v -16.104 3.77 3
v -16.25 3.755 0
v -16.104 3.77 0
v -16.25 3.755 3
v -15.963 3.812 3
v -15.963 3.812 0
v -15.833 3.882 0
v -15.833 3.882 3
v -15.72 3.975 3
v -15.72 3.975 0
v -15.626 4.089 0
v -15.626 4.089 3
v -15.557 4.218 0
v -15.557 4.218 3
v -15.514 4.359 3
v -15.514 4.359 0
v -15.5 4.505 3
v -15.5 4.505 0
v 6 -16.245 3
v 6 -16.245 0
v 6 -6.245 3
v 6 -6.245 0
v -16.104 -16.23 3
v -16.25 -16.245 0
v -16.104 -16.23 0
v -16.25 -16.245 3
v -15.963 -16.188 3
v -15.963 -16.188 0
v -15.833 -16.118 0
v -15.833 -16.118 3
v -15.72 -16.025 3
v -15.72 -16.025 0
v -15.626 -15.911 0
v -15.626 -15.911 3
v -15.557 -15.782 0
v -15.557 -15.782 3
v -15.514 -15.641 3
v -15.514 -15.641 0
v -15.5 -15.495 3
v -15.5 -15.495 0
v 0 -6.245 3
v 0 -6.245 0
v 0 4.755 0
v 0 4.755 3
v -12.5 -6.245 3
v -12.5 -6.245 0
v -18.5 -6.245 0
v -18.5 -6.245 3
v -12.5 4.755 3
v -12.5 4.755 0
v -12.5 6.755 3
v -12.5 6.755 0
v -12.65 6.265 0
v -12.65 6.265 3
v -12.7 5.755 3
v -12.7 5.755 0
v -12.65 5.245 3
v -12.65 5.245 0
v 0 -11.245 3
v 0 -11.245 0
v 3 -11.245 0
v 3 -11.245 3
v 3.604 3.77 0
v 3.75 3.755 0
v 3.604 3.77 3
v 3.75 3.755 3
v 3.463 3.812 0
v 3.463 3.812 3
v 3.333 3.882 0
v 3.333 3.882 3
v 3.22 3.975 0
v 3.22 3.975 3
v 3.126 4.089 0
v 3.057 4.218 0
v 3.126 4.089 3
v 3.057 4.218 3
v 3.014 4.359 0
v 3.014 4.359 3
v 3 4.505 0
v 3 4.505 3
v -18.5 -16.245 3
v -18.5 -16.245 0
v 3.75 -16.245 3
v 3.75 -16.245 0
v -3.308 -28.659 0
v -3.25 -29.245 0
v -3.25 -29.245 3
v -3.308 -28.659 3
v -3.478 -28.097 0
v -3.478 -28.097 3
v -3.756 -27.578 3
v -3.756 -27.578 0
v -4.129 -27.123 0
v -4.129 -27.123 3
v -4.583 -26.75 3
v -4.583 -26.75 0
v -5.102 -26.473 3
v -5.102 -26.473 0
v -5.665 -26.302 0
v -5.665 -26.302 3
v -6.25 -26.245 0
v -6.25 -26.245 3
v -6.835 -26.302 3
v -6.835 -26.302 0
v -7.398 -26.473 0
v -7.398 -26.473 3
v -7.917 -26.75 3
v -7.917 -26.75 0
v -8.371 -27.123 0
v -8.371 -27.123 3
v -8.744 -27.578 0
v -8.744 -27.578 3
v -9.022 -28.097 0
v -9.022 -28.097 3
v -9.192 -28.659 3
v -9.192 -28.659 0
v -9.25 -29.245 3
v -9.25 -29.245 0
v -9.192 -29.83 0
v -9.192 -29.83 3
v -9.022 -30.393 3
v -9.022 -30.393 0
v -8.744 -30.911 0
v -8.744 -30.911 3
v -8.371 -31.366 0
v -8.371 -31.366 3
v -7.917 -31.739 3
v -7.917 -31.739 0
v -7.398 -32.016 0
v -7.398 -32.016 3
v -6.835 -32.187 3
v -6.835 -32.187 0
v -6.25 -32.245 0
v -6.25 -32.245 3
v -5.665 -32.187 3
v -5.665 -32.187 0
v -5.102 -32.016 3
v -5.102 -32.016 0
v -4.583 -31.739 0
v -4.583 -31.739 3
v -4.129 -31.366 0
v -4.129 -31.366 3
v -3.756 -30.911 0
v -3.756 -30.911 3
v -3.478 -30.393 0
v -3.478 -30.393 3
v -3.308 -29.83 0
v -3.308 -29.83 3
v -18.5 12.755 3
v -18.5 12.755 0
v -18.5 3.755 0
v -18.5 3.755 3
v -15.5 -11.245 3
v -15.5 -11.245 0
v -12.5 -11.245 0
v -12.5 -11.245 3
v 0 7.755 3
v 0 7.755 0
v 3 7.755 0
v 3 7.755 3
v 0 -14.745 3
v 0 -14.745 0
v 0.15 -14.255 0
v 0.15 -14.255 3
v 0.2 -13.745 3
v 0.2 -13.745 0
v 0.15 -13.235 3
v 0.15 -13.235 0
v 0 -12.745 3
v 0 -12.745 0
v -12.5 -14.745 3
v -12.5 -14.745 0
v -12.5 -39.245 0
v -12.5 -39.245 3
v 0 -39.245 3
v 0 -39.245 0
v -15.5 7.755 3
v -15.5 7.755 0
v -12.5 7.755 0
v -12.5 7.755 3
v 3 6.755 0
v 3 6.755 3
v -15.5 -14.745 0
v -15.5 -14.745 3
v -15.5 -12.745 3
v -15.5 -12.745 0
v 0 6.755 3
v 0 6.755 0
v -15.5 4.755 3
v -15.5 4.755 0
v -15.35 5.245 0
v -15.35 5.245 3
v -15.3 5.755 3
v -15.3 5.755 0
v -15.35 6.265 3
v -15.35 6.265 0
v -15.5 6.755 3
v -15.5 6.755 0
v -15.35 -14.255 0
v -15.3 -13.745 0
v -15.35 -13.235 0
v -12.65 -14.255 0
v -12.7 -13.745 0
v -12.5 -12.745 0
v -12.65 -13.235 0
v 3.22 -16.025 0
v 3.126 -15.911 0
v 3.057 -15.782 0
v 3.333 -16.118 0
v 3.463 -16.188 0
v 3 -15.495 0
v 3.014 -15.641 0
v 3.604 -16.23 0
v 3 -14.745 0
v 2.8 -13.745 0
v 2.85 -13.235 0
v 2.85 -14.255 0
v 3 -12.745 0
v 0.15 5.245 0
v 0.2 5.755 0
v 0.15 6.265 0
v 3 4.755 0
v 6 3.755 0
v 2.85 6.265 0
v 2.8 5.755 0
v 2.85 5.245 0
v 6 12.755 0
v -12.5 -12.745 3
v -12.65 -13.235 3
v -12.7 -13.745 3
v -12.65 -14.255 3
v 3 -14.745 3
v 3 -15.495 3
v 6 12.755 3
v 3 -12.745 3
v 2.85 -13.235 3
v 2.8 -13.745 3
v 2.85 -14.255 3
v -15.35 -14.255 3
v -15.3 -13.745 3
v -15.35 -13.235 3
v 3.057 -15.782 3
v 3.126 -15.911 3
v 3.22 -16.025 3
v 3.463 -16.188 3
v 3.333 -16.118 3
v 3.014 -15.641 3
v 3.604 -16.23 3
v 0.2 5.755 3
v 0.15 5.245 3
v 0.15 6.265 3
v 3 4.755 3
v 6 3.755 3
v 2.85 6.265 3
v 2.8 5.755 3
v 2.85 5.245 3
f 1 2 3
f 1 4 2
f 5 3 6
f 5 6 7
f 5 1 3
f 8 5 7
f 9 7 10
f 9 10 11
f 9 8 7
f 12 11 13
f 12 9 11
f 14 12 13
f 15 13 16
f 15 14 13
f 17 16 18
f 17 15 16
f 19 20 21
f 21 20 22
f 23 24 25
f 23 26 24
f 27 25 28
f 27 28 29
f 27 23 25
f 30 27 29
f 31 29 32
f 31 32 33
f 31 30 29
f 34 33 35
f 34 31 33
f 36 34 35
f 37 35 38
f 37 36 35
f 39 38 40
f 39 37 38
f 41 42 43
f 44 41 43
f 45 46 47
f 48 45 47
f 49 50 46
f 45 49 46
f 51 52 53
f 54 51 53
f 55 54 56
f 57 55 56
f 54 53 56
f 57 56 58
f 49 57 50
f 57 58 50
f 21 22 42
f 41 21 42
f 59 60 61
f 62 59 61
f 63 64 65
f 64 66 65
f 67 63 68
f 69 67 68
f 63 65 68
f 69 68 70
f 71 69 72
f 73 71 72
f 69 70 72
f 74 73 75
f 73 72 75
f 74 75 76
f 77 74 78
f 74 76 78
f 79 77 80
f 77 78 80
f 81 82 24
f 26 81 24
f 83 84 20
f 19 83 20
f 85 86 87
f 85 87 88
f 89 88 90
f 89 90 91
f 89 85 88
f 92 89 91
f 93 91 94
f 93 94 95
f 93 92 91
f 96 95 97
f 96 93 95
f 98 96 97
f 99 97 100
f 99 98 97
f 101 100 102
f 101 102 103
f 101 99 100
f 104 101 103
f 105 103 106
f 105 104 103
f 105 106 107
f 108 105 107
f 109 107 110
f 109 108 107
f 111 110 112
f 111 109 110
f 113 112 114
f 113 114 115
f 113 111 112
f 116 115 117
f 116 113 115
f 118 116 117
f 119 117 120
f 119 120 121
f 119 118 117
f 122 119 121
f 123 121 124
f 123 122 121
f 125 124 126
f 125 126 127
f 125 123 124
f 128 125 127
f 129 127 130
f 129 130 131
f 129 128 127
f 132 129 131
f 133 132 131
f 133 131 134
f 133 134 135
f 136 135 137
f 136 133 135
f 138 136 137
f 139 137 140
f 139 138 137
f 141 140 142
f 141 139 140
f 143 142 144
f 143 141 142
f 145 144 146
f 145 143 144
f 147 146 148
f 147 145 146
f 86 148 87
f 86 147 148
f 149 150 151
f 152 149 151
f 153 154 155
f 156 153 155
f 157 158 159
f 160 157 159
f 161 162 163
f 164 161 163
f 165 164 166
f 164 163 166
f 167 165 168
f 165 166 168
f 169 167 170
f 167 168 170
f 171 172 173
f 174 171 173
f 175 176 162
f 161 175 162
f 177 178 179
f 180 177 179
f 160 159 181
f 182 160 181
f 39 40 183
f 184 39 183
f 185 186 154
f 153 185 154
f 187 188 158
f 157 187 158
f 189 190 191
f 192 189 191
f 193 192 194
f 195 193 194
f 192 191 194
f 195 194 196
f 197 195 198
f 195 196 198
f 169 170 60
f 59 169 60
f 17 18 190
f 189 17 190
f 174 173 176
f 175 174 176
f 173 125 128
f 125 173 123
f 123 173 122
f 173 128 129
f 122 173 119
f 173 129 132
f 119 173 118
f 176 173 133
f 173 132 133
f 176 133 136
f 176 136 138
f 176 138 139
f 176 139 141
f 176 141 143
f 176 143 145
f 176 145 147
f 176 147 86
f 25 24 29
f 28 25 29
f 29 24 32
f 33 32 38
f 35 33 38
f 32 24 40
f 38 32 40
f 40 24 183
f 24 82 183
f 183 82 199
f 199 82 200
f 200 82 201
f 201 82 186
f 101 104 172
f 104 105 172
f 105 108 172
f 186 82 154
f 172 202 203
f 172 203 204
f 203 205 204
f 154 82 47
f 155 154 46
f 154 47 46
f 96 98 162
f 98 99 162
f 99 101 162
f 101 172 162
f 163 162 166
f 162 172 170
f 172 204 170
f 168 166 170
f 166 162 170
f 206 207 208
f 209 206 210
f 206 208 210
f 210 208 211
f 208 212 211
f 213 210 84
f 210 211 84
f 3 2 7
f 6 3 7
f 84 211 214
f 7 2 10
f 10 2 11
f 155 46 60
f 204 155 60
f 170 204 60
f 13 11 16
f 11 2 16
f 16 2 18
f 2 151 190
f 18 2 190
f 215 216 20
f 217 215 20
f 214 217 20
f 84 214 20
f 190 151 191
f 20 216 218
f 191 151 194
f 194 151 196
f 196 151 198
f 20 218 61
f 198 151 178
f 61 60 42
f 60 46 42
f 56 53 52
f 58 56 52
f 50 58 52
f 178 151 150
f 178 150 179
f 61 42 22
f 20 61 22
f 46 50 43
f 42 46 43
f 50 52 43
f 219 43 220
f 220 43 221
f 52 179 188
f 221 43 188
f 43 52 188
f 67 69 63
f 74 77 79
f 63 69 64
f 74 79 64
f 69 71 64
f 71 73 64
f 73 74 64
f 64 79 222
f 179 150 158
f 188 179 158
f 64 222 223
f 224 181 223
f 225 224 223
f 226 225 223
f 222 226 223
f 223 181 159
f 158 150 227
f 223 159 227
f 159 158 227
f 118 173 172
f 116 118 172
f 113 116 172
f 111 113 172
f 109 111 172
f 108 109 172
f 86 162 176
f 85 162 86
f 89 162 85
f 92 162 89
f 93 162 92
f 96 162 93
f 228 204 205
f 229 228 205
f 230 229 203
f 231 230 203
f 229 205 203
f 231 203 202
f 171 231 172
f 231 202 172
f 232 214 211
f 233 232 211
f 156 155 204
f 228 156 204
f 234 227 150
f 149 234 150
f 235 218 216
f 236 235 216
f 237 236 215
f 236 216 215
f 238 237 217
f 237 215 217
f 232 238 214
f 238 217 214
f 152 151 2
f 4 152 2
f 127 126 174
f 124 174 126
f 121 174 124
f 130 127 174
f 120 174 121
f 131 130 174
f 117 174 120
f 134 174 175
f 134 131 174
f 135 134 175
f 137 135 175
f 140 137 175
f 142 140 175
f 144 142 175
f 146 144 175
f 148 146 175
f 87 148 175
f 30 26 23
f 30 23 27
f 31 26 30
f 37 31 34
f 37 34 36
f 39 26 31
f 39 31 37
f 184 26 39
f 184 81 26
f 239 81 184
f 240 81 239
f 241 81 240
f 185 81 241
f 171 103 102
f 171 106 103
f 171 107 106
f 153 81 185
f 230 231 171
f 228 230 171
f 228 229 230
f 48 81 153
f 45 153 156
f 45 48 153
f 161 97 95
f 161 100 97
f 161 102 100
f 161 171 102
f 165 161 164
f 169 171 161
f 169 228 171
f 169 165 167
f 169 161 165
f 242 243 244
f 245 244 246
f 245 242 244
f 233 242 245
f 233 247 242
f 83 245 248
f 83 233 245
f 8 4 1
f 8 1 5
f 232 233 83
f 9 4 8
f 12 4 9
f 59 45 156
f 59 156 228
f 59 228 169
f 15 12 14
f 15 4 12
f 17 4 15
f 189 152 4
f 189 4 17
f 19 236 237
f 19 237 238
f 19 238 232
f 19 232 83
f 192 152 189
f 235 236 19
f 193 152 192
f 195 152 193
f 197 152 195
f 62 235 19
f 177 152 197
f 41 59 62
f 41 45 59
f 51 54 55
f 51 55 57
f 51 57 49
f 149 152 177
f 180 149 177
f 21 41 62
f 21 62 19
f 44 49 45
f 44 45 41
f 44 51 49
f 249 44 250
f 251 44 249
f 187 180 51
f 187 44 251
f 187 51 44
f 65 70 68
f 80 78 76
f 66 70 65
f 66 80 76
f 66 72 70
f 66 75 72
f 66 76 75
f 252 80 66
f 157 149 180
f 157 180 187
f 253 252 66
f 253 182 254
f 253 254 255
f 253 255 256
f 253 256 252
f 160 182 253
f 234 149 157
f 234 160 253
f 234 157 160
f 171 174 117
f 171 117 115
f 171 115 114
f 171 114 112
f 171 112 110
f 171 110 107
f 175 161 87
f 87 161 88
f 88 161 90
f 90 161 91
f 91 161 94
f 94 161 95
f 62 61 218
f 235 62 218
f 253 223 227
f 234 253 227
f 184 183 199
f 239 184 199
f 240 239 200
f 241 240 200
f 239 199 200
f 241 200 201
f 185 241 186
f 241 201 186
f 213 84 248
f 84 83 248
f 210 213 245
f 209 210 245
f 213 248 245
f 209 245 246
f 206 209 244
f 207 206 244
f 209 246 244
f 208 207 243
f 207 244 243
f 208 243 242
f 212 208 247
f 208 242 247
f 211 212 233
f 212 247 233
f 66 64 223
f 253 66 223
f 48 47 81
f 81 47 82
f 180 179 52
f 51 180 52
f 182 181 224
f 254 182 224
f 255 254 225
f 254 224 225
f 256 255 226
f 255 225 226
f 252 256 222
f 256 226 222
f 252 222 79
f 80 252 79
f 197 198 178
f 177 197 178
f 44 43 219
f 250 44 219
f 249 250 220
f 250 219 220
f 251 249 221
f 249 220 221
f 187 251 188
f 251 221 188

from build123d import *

# Parameters (mm, degrees)
SKETCH1_R           = 3
BOSS_EXTRUDE1_DEPTH = 3
FILLET3_R           = 0.75
FILLET4_R           = 0.75


with BuildPart() as part:
    # Sketch1 → Boss-Extrude1 (new body)
    with BuildSketch(Plane.XY):
        with BuildLine():
            Line((6, 12.755292895), (-18.5, 12.755292895))
            Line((-18.5, 12.755292895), (-18.5, 3.755292895))
            Line((-18.5, 3.755292895), (-15.5, 3.755292895))
            Line((-15.5, 3.755292895), (-15.5, 4.755292895))
            ThreePointArc((-15.5, 4.755292895), (-15.3, 5.755292895), (-15.5, 6.755292895))
            Line((-15.5, 6.755292895), (-15.5, 7.755292895))
            Line((-15.5, 7.755292895), (-12.5, 7.755292895))
            Line((-12.5, 7.755292895), (-12.5, 6.755292895))
            ThreePointArc((-12.5, 6.755292895), (-12.7, 5.755292895), (-12.5, 4.755292895))
            Line((-12.5, 4.755292895), (-12.5, -6.244707105))
            Line((-12.5, -6.244707105), (-18.5, -6.244707105))
            Line((-18.5, -6.244707105), (-18.5, -16.244707105))
            Line((-18.5, -16.244707105), (-15.5, -16.244707105))
            Line((-15.5, -16.244707105), (-15.5, -14.744707105))
            ThreePointArc((-15.5, -14.744707105), (-15.3, -13.744707105), (-15.5, -12.744707105))
            Line((-15.5, -12.744707105), (-15.5, -11.244707105))
            Line((-15.5, -11.244707105), (-12.5, -11.244707105))
            Line((-12.5, -11.244707105), (-12.5, -12.744707105))
            ThreePointArc((-12.5, -12.744707105), (-12.7, -13.744707105), (-12.5, -14.744707105))
            Line((-12.5, -14.744707105), (-12.5, -39.244707105))
            Line((-12.5, -39.244707105), (0, -39.244707105))
            Line((0, -39.244707105), (0, -14.744707105))
            ThreePointArc((0, -14.744707105), (0.2, -13.744707105), (0, -12.744707105))
            Line((0, -12.744707105), (0, -11.244707105))
            Line((0, -11.244707105), (3, -11.244707105))
            Line((3, -11.244707105), (3, -12.744707105))
            ThreePointArc((3, -12.744707105), (2.8, -13.744707105), (3, -14.744707105))
            Line((3, -14.744707105), (3, -16.244707105))
            Line((3, -16.244707105), (6, -16.244707105))
            Line((6, -16.244707105), (6, -6.244707105))
            Line((6, -6.244707105), (0, -6.244707105))
            Line((0, -6.244707105), (0, 4.755292895))
            ThreePointArc((0, 4.755292895), (0.2, 5.755292895), (0, 6.755292895))
            Line((0, 6.755292895), (0, 7.755292895))
            Line((0, 7.755292895), (3, 7.755292895))
            Line((3, 7.755292895), (3, 6.755292895))
            ThreePointArc((3, 6.755292895), (2.8, 5.755292895), (3, 4.755292895))
            Line((3, 4.755292895), (3, 3.755292895))
            Line((3, 3.755292895), (6, 3.755292895))
            Line((6, 3.755292895), (6, 12.755292895))
        make_face()
        with Locations((-6.25, -29.244707105)):
            Circle(SKETCH1_R, mode=Mode.SUBTRACT)
    extrude(amount=BOSS_EXTRUDE1_DEPTH)

    # Fillet3
    fillet3_edges = [part.edges().sort_by_distance(p)[0] for p in [
        (3, 3.755292895, 1.5),
    ]]
    fillet(fillet3_edges, radius=FILLET3_R)

    # Fillet4
    fillet4_edges = [part.edges().sort_by_distance(p)[0] for p in [
        (-15.5, 3.755292895, 1.5),
        (3, -16.244707105, 1.5),
        (-15.5, -16.244707105, 1.5),
    ]]
    fillet(fillet4_edges, radius=FILLET4_R)


solid = part.part
